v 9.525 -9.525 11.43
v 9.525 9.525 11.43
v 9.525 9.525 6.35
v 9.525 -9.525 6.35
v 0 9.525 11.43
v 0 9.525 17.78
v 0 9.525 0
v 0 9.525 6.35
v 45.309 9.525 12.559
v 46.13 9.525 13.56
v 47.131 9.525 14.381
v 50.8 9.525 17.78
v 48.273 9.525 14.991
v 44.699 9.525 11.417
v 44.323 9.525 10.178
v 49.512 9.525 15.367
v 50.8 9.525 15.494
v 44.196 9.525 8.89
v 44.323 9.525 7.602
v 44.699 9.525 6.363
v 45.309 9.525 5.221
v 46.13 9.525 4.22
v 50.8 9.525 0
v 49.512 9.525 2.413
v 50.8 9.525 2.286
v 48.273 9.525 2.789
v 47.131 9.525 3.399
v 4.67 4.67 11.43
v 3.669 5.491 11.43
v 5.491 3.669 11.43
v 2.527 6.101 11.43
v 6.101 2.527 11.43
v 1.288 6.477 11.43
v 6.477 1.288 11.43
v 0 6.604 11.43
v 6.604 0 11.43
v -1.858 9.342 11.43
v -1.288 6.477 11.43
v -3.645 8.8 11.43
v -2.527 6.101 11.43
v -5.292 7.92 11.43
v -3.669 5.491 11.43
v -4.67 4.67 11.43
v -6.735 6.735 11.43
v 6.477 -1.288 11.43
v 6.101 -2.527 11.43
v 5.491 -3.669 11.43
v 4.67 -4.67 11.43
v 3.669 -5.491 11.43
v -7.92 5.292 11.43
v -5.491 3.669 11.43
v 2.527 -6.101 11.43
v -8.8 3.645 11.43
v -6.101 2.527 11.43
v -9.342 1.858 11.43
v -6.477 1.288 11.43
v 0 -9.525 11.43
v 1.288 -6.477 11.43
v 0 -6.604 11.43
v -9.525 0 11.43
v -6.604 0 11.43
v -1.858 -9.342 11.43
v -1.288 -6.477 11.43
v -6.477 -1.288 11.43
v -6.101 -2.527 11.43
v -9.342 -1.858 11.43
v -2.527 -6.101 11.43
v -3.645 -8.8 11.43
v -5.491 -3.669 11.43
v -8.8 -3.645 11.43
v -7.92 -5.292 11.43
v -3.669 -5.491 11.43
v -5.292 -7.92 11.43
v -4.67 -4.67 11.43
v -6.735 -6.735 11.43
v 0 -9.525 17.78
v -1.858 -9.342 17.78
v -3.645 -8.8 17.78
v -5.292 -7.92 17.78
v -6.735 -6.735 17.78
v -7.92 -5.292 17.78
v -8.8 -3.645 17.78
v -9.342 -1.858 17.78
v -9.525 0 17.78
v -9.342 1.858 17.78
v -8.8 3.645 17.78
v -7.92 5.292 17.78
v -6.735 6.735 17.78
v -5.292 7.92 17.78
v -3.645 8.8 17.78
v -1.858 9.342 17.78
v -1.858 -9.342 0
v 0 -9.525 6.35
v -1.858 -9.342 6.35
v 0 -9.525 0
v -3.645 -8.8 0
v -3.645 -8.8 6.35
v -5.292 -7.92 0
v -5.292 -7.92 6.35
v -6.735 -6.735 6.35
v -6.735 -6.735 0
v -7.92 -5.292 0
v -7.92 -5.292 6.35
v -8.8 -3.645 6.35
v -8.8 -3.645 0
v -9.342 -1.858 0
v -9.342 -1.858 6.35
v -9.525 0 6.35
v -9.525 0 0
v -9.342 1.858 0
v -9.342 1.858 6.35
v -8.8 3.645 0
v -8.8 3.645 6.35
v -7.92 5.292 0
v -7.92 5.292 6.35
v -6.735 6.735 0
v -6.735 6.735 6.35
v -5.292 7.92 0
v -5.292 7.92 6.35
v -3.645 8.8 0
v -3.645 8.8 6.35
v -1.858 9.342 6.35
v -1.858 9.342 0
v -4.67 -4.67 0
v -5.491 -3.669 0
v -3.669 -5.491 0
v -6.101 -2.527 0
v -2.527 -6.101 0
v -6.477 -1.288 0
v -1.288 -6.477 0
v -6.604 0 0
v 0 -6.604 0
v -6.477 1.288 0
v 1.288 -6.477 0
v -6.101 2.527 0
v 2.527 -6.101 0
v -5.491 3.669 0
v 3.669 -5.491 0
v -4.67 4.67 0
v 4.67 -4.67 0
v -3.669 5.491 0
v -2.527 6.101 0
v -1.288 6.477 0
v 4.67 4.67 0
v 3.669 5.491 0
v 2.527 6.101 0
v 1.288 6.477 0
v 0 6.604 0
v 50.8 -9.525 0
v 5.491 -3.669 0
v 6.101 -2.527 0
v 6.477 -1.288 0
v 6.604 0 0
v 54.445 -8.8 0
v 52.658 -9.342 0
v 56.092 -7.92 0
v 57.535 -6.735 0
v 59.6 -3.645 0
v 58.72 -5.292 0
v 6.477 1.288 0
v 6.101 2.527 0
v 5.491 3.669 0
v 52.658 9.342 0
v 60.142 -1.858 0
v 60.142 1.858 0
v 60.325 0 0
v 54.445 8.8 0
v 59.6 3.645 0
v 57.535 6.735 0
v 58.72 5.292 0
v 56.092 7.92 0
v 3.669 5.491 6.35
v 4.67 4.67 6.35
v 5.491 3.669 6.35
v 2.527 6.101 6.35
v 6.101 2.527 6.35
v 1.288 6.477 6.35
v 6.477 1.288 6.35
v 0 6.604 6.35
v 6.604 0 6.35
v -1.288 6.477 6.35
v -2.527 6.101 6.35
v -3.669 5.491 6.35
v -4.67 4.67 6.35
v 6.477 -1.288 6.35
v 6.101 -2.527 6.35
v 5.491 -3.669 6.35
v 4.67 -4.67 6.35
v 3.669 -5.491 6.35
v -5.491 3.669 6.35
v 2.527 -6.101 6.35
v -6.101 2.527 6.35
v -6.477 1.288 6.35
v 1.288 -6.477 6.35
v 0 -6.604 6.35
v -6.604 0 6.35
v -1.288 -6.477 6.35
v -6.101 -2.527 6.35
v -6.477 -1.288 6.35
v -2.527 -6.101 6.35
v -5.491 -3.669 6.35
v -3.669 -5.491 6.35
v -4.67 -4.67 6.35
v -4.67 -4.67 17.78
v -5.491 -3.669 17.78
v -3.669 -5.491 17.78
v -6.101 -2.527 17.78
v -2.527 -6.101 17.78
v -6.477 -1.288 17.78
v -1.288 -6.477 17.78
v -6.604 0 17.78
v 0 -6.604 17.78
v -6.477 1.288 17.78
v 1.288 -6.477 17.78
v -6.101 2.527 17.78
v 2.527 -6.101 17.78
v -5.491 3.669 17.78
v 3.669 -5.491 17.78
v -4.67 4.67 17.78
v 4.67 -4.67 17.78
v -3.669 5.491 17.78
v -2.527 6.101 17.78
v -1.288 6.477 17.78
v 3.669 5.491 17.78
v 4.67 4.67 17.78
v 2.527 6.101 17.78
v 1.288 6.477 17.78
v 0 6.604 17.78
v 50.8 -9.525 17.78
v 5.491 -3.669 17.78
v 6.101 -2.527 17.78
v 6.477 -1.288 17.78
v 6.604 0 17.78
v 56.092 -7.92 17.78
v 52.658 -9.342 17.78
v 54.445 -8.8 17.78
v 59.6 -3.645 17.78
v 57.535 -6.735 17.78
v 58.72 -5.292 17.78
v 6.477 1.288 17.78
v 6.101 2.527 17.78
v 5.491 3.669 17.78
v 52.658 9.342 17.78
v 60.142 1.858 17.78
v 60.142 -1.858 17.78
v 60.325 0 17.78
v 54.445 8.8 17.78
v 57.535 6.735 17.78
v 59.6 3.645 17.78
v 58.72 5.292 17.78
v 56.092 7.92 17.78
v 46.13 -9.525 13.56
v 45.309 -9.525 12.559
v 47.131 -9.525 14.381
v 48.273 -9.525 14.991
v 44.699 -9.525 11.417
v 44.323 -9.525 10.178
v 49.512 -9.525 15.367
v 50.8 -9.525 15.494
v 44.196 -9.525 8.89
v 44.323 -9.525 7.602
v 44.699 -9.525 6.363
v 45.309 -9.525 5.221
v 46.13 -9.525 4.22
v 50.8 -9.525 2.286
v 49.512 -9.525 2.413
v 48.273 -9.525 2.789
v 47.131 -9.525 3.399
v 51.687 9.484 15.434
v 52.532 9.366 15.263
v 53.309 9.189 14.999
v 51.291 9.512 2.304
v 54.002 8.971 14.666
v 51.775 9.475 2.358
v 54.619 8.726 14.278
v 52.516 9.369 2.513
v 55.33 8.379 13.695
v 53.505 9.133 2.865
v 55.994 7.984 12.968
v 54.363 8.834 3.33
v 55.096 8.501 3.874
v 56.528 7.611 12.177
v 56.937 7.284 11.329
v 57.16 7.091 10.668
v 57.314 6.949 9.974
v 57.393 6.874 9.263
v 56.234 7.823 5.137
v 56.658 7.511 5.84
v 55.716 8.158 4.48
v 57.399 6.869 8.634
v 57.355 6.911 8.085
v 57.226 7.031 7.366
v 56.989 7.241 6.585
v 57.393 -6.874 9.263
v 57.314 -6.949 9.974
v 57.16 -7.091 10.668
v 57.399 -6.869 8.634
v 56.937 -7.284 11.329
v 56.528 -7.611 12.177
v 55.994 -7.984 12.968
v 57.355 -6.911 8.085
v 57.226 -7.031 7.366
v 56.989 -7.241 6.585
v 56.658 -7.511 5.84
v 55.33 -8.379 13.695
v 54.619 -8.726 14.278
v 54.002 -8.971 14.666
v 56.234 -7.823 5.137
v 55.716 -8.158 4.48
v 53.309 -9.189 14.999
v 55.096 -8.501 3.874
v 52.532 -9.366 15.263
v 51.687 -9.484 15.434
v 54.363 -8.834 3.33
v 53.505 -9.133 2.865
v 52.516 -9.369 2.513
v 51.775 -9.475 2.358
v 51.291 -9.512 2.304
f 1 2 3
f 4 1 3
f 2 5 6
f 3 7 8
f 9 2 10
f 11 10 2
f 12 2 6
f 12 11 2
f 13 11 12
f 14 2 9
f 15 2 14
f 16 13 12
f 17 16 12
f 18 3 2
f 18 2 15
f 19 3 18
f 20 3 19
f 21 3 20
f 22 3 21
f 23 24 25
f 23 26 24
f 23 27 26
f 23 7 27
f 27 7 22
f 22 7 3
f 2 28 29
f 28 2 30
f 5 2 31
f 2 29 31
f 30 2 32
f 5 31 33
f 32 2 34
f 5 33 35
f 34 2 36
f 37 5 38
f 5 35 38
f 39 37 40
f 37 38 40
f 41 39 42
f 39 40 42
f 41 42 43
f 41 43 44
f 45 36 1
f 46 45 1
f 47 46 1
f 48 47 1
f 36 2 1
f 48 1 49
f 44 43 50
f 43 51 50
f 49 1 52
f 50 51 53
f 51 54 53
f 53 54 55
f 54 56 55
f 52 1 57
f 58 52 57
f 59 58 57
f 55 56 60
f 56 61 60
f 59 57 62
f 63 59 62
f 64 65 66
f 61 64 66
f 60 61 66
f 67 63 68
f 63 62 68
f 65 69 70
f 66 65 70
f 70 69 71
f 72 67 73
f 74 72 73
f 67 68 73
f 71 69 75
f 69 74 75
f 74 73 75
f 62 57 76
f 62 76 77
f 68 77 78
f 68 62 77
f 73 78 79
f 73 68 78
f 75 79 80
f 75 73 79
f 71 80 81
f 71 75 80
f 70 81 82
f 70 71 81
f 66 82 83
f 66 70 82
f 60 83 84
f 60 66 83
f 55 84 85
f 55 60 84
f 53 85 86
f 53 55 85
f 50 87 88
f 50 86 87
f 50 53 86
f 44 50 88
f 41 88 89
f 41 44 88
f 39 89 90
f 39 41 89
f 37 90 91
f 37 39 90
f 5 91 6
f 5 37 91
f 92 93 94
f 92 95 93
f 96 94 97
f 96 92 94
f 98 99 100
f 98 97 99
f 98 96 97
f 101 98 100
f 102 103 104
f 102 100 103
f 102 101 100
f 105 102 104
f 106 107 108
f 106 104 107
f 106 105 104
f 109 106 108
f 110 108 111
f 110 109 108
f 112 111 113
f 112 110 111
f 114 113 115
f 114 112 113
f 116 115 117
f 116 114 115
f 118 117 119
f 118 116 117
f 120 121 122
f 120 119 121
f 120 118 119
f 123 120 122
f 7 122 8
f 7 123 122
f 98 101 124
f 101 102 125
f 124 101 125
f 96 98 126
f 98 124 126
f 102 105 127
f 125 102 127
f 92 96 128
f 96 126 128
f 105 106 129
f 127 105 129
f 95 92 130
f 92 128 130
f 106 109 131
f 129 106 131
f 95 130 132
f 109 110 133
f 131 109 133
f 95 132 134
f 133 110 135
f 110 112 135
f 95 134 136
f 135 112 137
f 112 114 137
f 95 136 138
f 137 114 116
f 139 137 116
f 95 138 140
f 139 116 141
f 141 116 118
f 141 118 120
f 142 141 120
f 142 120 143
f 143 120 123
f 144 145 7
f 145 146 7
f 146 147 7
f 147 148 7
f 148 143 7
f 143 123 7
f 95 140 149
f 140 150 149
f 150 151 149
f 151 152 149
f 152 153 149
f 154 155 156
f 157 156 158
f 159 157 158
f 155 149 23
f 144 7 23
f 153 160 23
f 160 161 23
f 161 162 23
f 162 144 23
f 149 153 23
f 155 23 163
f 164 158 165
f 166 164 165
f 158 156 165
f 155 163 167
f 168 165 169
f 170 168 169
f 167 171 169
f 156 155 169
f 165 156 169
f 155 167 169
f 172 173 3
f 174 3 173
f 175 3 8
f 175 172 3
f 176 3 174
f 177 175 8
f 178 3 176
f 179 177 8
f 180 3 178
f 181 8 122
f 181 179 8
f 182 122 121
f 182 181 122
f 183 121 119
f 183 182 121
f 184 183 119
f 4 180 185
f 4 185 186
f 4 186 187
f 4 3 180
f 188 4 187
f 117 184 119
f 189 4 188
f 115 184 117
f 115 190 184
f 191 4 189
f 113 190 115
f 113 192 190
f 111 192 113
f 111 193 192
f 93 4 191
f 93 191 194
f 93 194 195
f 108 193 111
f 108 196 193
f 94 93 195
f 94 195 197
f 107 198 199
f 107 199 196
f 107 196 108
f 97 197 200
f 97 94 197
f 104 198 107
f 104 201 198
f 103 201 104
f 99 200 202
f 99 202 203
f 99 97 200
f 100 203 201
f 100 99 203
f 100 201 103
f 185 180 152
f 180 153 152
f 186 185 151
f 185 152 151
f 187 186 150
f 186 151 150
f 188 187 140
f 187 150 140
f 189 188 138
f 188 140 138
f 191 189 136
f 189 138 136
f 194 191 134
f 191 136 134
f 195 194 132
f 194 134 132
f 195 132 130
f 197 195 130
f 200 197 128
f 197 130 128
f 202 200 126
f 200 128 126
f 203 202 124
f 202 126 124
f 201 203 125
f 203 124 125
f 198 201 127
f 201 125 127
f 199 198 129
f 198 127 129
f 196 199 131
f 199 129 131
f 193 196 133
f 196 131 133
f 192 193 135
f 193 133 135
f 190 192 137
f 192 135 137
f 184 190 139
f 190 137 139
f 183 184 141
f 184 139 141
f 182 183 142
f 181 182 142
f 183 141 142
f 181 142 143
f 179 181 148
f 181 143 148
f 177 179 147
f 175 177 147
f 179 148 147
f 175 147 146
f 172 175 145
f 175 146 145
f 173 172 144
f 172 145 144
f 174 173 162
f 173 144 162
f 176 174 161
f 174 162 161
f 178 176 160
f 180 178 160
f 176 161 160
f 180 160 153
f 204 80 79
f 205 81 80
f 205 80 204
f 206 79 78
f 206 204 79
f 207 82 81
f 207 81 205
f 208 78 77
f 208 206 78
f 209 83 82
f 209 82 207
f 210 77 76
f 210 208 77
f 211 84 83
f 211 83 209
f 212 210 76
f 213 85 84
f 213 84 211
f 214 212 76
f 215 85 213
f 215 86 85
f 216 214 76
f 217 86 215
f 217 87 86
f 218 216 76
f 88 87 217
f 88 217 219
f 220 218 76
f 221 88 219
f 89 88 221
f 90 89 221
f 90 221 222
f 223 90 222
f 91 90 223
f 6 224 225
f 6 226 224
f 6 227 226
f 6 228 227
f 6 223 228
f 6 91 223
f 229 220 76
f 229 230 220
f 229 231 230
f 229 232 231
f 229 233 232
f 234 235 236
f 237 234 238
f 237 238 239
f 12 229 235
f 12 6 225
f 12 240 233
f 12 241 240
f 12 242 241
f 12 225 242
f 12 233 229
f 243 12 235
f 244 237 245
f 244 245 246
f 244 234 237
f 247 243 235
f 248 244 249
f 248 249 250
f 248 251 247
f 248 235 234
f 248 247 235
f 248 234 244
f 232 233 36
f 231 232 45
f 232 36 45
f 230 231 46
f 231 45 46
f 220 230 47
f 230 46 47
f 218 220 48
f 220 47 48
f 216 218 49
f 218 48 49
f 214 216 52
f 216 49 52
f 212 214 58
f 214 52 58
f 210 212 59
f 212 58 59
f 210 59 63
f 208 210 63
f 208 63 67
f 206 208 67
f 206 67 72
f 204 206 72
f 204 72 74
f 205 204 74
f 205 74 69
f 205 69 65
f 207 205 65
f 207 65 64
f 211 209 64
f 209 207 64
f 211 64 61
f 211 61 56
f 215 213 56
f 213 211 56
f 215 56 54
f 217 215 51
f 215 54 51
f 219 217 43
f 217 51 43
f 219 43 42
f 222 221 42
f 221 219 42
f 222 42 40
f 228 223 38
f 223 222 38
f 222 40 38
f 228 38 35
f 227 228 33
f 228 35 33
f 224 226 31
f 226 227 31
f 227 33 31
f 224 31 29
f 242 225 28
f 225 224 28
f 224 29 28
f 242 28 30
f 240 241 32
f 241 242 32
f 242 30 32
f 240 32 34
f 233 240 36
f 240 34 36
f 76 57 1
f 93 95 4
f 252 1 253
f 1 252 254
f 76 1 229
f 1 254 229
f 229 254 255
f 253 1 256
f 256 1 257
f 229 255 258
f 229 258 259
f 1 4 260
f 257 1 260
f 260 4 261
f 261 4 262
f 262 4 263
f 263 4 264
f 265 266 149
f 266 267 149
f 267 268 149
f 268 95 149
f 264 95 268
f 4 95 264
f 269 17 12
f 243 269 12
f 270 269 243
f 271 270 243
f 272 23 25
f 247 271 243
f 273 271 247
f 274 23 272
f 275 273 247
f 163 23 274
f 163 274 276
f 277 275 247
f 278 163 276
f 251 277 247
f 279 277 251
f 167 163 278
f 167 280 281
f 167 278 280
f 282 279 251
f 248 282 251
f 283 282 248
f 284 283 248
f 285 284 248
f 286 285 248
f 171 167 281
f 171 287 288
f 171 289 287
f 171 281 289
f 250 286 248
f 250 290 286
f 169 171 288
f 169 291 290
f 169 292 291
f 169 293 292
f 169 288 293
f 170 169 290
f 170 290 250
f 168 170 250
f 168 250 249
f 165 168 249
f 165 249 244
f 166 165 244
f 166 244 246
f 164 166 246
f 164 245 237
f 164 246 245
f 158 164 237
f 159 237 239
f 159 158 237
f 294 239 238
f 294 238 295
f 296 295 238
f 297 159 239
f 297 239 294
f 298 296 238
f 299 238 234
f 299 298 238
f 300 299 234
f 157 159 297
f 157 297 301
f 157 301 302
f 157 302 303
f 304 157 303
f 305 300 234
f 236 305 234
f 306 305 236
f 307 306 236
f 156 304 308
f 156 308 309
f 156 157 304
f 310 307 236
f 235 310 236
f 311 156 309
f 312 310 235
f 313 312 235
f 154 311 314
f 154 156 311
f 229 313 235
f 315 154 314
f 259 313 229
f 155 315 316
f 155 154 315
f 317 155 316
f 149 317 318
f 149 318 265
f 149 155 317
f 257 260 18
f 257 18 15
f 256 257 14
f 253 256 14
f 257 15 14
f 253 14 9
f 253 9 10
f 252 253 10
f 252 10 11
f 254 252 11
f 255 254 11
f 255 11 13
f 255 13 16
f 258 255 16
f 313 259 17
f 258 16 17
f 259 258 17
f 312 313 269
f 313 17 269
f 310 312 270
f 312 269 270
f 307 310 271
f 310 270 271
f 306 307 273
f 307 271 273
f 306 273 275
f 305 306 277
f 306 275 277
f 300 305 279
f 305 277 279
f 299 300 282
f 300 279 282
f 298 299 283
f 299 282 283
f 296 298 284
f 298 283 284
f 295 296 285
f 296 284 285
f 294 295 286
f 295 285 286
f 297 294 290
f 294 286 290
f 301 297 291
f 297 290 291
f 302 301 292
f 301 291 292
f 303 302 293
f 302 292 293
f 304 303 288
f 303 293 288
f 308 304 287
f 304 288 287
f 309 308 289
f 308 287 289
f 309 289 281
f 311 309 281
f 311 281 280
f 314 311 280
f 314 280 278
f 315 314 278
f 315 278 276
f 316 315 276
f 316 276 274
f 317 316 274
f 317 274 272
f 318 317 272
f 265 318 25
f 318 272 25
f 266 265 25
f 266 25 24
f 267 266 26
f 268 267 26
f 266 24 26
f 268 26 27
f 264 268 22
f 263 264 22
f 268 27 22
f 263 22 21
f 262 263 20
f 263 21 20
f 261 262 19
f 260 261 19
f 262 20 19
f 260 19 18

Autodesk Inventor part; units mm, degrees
ref_plane "YZ Plane" through (0, 0, 0) normal (1, 0, 0) x (0, 1, 0)
ref_plane "XZ Plane" through (0, 0, 0) normal (0, 1, 0) x (-1, 0, 0)
ref_plane "XY Plane" through (0, 0, 0) normal (0, 0, 1) x (1, 0, 0)
sketch "Sketch1" plane through (0, 0, 0) normal (0, 0, 1) x (1, 0, 0)
  circle A0 centre (0, 0) radius 6.604
  arc A1 (0, 9.525) -> (0, -9.525) centre (0, 0) ccw
  line L0 (0, 9.525) -> (50.8, 9.525)
  line L1 (0, -9.525) -> (50.8, -9.525)
  arc A2 (50.8, -9.525) -> (50.8, 9.525) centre (50.8, 0) ccw
  dimension "d0" = 13.208
  dimension "d1" = 19.05
  dimension "d2" = 50.8
  dimension "d3" = 50.8
  dimension "d4" = 19.05
extrude "Extrusion1" add sketch "Sketch1" along normal blind 17.78
sketch "Sketch2" plane through (0, 0, 0) normal (0, 1, 0) x (-1, 0, 0)
  line L0 (9.525, 17.78) -> (0, 17.78) projected
  line L1 (9.525, 17.78) -> (9.525, 0)
  line L2 (9.525, 0) -> (9.525, 17.78) projected
  line L3 (0, 0) -> (0, 17.78) projected
  line L4 (9.525, 8.89) -> (0, 8.89)
  line L5 (0, 8.89) -> (0, 6.35)
  line L6 (0, 6.35) -> (9.525, 6.35)
  line L7 (9.525, 6.35) -> (9.525, 8.89)
  line L8 (9.525, 8.89) -> (0, 8.89)
  line L9 (0, 8.89) -> (0, 11.43)
  line L10 (0, 11.43) -> (9.525, 11.43)
  line L11 (9.525, 11.43) -> (9.525, 8.89)
  line L12 (0, 6.35) -> (-10.1637, 6.35)
  line L13 (-10.1637, 6.35) -> (-10.1637, 11.43)
  line L14 (-10.1637, 11.43) -> (0, 11.43)
  line L15 (0, 11.43) -> (0, 6.35)
  line L16 (9.525, 11.43) -> (-9.525, 11.43)
  line L17 (-9.525, 11.43) -> (-9.525, 6.35)
  line L18 (-9.525, 6.35) -> (9.525, 6.35)
  line L19 (9.525, 6.35) -> (9.525, 11.43)
  dimension "d8" = 2.54
  dimension "d9" = 2.54
  dimension "d10" = 19.05
extrude "Extrusion2" cut sketch "Sketch2" along normal mid plane 25.7175 contours L1 L4 L3 L10 | L3 L12 L17 L14 | L1 L6 L3 L4
sketch "Sketch3" plane through (0, 0, 0) normal (0, 1, 0) x (-1, 0, 0)
  line L0 (-50.8, 0) -> (-50.8, 17.78) projected
  circle A0 centre (-50.8, 8.89) radius 6.604
  point P0 (0, 0)
  dimension "d13" = 13.208
extrude "Extrusion3" cut sketch "Sketch3" along normal mid plane 25.7175
properties part number "toplegV2"
